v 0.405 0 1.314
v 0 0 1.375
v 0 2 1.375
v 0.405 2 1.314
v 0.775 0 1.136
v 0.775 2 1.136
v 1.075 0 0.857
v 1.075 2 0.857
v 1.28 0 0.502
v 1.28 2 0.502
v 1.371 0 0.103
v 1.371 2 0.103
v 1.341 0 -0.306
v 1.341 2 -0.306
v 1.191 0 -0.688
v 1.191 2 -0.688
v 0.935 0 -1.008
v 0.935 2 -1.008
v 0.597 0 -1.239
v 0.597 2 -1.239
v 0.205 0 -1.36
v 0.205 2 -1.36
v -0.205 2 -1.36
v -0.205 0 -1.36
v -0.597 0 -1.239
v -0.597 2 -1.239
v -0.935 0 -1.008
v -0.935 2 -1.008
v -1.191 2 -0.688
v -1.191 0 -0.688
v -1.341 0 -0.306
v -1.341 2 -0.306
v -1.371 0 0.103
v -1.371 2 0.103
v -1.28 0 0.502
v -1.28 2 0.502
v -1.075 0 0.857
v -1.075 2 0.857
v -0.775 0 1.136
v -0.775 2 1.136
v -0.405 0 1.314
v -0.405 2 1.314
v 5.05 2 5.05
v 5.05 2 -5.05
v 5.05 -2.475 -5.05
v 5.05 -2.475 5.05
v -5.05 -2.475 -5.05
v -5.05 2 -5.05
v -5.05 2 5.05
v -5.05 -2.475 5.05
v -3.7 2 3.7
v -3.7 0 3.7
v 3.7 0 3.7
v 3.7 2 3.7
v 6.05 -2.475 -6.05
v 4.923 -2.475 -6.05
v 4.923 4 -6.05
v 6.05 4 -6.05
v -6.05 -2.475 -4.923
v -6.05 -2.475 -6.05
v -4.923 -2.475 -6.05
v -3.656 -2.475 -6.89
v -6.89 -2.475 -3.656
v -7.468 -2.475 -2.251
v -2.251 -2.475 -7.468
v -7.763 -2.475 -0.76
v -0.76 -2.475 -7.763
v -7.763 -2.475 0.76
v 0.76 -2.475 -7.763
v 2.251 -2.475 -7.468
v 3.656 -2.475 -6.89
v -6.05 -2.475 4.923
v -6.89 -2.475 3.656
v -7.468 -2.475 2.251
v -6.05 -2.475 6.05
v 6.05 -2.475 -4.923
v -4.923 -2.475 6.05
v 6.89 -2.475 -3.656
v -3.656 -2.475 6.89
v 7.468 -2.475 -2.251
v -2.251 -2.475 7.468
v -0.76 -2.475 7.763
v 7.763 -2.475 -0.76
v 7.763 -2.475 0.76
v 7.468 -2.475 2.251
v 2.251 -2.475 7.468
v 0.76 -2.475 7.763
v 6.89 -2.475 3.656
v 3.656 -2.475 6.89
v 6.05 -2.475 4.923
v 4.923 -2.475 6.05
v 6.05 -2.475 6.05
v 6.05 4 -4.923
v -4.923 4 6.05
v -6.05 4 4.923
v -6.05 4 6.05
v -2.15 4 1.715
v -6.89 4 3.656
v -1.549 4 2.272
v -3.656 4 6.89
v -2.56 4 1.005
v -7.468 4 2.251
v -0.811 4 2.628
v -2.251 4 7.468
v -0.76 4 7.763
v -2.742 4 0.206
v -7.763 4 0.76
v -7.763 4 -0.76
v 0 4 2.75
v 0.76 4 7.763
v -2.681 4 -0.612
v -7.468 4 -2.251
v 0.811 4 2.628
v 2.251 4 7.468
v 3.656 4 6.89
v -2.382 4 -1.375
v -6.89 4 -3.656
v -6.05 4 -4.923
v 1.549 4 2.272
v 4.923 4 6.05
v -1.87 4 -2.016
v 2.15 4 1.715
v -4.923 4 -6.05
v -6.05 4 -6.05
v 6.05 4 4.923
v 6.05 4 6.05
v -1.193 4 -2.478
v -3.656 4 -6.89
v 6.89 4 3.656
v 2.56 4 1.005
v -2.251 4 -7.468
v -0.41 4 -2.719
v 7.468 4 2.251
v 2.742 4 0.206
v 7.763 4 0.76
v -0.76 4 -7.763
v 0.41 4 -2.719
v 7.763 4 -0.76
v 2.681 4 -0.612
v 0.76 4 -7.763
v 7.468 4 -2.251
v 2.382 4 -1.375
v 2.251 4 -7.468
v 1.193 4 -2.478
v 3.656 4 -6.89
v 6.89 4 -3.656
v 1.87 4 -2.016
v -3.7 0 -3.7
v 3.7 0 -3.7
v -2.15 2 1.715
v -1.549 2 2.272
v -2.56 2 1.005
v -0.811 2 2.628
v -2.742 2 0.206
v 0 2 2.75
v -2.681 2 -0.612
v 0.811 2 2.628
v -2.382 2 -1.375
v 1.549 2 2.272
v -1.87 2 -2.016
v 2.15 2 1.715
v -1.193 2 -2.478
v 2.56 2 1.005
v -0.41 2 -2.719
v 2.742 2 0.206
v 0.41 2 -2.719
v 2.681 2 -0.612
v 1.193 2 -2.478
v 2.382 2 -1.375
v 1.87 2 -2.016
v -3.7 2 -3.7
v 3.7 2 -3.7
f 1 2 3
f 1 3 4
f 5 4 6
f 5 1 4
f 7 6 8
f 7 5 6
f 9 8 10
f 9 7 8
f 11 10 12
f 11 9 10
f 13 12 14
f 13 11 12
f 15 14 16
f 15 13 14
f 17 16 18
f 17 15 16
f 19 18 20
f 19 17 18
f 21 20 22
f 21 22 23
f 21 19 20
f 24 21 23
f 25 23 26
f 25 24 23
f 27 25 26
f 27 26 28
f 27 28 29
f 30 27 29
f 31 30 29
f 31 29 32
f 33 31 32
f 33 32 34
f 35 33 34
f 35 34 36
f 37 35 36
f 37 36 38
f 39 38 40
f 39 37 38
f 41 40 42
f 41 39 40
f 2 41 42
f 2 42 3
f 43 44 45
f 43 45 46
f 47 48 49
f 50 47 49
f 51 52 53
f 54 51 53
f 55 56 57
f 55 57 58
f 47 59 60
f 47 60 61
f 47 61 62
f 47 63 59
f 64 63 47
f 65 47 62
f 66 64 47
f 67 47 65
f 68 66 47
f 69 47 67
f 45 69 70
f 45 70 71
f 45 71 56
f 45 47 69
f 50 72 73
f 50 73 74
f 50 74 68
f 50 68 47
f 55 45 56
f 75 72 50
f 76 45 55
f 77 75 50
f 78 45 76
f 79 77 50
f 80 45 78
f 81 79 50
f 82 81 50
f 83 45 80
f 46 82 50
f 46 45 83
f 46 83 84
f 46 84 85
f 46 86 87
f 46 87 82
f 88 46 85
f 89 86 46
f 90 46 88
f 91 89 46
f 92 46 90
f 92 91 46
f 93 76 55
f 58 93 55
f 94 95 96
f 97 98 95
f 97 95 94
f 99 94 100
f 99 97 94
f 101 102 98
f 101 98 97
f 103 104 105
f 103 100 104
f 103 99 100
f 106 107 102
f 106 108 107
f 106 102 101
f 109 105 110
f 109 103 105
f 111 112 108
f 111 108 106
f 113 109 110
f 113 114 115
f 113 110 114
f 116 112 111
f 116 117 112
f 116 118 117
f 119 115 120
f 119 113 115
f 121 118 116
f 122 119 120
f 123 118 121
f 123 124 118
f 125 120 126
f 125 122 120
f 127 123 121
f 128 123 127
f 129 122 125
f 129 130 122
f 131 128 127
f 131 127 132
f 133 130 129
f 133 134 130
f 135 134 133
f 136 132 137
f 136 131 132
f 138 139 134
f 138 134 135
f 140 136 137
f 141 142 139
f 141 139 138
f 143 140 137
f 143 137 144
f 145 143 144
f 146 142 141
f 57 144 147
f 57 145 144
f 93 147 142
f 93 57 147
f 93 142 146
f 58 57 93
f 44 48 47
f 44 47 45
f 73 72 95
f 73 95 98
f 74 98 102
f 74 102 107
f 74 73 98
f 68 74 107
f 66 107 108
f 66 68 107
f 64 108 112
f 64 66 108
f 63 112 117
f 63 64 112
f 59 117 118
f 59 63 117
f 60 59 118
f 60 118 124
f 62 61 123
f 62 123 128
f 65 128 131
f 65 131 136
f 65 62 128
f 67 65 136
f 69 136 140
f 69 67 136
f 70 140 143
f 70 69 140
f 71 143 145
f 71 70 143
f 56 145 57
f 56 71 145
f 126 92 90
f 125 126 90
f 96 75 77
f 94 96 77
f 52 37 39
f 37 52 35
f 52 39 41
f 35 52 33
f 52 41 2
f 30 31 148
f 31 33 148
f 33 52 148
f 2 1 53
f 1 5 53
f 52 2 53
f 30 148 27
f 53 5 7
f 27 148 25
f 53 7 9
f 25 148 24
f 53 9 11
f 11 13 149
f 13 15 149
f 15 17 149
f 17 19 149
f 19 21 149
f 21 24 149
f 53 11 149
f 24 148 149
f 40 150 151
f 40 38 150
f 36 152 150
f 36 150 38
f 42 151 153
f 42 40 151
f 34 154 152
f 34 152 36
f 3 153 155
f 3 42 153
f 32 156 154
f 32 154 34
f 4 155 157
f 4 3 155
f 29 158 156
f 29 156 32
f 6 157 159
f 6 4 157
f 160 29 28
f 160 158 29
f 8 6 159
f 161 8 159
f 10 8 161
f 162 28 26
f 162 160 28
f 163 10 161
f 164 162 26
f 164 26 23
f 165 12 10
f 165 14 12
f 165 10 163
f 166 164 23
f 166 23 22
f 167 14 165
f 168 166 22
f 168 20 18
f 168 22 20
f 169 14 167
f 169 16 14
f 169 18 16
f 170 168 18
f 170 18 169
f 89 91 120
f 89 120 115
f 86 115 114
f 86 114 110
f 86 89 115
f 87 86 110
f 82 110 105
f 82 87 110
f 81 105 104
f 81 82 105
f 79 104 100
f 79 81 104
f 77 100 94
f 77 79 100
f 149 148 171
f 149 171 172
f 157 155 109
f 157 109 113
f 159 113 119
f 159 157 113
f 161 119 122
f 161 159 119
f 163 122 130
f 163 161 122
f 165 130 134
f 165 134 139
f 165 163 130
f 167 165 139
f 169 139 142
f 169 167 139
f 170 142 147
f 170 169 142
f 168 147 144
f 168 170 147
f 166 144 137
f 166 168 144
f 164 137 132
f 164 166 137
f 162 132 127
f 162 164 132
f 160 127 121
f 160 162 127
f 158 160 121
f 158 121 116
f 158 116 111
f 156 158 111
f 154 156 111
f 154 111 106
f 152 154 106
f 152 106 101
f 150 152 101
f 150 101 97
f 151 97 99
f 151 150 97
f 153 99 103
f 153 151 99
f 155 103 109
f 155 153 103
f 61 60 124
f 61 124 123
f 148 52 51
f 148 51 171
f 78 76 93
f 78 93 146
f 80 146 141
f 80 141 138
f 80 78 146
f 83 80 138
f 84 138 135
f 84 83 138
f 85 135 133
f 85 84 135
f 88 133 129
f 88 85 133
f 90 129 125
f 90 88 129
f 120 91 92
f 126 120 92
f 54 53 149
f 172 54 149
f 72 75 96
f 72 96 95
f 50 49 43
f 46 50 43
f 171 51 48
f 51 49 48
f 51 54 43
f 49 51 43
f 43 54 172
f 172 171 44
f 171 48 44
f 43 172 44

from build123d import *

# Parameters (mm, degrees)
SKETCH1_W           = 7.4
SKETCH1_H           = 7.4
SKETCH1_R           = 1.375
BOSS_EXTRUDE1_DEPTH = 2
SKETCH2_W           = 12.1
SKETCH2_H           = 12.1
SKETCH2_W_2         = 10.1
SKETCH2_H_2         = 10.1
BOSS_EXTRUDE2_DEPTH = 2
SKETCH3_W           = 12.1
SKETCH3_H           = 12.1
SKETCH3_R           = 2.75
BOSS_EXTRUDE3_DEPTH = 2
SKETCH4_R           = 2.75
SKETCH4_R_2         = 1.675
SKETCH4_R_3         = 1.375
BOSS_EXTRUDE4_DEPTH = 2
SKETCH5_R           = 1.675
BOSS_EXTRUDE5_DEPTH = 1.3
SKETCH10_W          = 12.1
SKETCH10_H          = 12.1
SKETCH10_W_2        = 10.1
SKETCH10_H_2        = 10.1
BOSS_EXTRUDE6_DEPTH = 3.175
SKETCH11_W          = 8.881017399
SKETCH11_H          = 18.09347602
CUT_EXTRUDE1_DEPTH  = 10
BOSS_EXTRUDE7_DEPTH = 6.475


with BuildPart() as part:
    # Sketch1 → Boss-Extrude1 (new body)
    with BuildSketch(Plane(origin=(0, 0, 0), x_dir=(1, 0, 0), z_dir=(0, 1, 0))):
        Rectangle(SKETCH1_W, SKETCH1_H)
        with Locations(Location((0, 0, 0), (0, 0, 270))):
            Circle(SKETCH1_R, mode=Mode.SUBTRACT)
    extrude(amount=BOSS_EXTRUDE1_DEPTH)



with BuildPart() as body_2:
    # Sketch2 → Boss-Extrude2 (new body)
    with BuildSketch(Plane(origin=(0, 2, 0), x_dir=(1, 0, 0), z_dir=(0, 1, 0))):
        Rectangle(SKETCH2_W, SKETCH2_H)
        Rectangle(SKETCH2_W_2, SKETCH2_H_2, mode=Mode.SUBTRACT)
    extrude(amount=-BOSS_EXTRUDE2_DEPTH)


with BuildPart() as part_1:
    add(part.part)

    add(body_2.part)  # Boss-Extrude3 merges body 2
    # Sketch3 → Boss-Extrude3 (add)
    with BuildSketch(Plane(origin=(0, 2, 0), x_dir=(1, 0, 0), z_dir=(0, 1, 0))):
        Rectangle(SKETCH3_W, SKETCH3_H)
        with Locations(Location((0, 0, 0), (0, 0, 270))):
            Circle(SKETCH3_R, mode=Mode.SUBTRACT)
    extrude(amount=BOSS_EXTRUDE3_DEPTH)

    # Sketch4 → Boss-Extrude4 (add)
    # profile 1 of 2: a face of its own
    with BuildSketch(Plane(origin=(0, 2, 0), x_dir=(1, 0, 0), z_dir=(0, 1, 0))):
        with BuildLine():
            Line((4, 0), (4, -20))
            ThreePointArc((4, -20), (0, -24), (-4, -20))
            Line((-4, -20), (-4, 0))
            ThreePointArc((-4, 0), (0, 4), (4, 0))
        make_face()
        with Locations(Location((0, 0, 0), (0, 0, 270))):
            Circle(SKETCH4_R, mode=Mode.SUBTRACT)
        with Locations(Location((0, -20, 0), (0, 0, 270))):
            Circle(SKETCH4_R_2, mode=Mode.SUBTRACT)
    # profile 2 of 2: a face of its own
    with BuildSketch(Plane(origin=(0, 2, 0), x_dir=(1, 0, 0), z_dir=(0, 1, 0))):
        with Locations(Location((0, 0, 0), (0, 0, 270))):
            Circle(SKETCH4_R_3)
    extrude(amount=BOSS_EXTRUDE4_DEPTH)


with BuildPart() as boss_extrude4_kept_piece:
    # of the separate pieces the step leaves, the one the design keeps (boss_extrude4_pieces_kept)
    add(part_1.part.solids().sort_by_distance((-3.7, 0, 3.7))[0])

    # Sketch5 → Boss-Extrude5 (add)
    # profile 1 of 2: a face of its own
    with BuildSketch(Plane(origin=(0, 2, 0), x_dir=(-1, 0, 0), z_dir=(0, -1, 0))):
        with BuildLine():
            ThreePointArc((-4, -20), (0, -16), (4, -20))
            Line((4, -20), (4, -6.05))
            Line((4, -6.05), (-4, -6.05))
            Line((-4, -6.05), (-4, -20))
        make_face()
    # profile 2 of 2: a face of its own
    with BuildSketch(Plane(origin=(0, 2, 0), x_dir=(-1, 0, 0), z_dir=(0, -1, 0))):
        with BuildLine():
            ThreePointArc((-4, -20), (0, -24), (4, -20))
            ThreePointArc((4, -20), (0, -16), (-4, -20))
        make_face()
        with Locations(Location((0, -20, 0), (0, 0, 90))):
            Circle(SKETCH5_R, mode=Mode.SUBTRACT)
    extrude(amount=BOSS_EXTRUDE5_DEPTH)

    # Sketch10 → Boss-Extrude6 (add)
    with BuildSketch(Plane.XZ.offset(-0.7)):
        Rectangle(SKETCH10_W, SKETCH10_H)
        Rectangle(SKETCH10_W_2, SKETCH10_H_2, mode=Mode.SUBTRACT)
    extrude(amount=BOSS_EXTRUDE6_DEPTH)

    # Sketch11 → Cut-Extrude1 (cut)
    with BuildSketch(Plane(origin=(0, 0.7, 0), x_dir=(-1, 0, 0), z_dir=(0, -1, 0))):
        with Locations((-0.4405087, -15.09673801)):
            Rectangle(SKETCH11_W, SKETCH11_H)
    extrude(amount=-CUT_EXTRUDE1_DEPTH, mode=Mode.SUBTRACT)

    # Sketch14 → Boss-Extrude7 (add)
    with BuildSketch(Plane(origin=(0, -2.475, 0), x_dir=(-1, 0, 0), z_dir=(0, -1, 0))):
        with BuildLine():
            Line((-4.923159555, 6.05), (4.923159555, 6.05))
            ThreePointArc((4.923159555, 6.05), (0, 7.8), (-4.923159555, 6.05))
        make_face()
        with BuildLine():
            ThreePointArc((6.05, -4.923159555), (7.8, 0), (6.05, 4.923159555))
            Line((6.05, 4.923159555), (6.05, -4.923159555))
        make_face()
        with BuildLine():
            Line((-6.05, -4.923159555), (-6.05, 4.923159555))
            ThreePointArc((-6.05, 4.923159555), (-7.8, 0), (-6.05, -4.923159555))
        make_face()
        with BuildLine():
            ThreePointArc((-4.923159555, -6.05), (0, -7.8), (4.923159555, -6.05))
            Line((4.923159555, -6.05), (-4.923159555, -6.05))
        make_face()
    extrude(amount=-BOSS_EXTRUDE7_DEPTH)


solid = boss_extrude4_kept_piece.part
